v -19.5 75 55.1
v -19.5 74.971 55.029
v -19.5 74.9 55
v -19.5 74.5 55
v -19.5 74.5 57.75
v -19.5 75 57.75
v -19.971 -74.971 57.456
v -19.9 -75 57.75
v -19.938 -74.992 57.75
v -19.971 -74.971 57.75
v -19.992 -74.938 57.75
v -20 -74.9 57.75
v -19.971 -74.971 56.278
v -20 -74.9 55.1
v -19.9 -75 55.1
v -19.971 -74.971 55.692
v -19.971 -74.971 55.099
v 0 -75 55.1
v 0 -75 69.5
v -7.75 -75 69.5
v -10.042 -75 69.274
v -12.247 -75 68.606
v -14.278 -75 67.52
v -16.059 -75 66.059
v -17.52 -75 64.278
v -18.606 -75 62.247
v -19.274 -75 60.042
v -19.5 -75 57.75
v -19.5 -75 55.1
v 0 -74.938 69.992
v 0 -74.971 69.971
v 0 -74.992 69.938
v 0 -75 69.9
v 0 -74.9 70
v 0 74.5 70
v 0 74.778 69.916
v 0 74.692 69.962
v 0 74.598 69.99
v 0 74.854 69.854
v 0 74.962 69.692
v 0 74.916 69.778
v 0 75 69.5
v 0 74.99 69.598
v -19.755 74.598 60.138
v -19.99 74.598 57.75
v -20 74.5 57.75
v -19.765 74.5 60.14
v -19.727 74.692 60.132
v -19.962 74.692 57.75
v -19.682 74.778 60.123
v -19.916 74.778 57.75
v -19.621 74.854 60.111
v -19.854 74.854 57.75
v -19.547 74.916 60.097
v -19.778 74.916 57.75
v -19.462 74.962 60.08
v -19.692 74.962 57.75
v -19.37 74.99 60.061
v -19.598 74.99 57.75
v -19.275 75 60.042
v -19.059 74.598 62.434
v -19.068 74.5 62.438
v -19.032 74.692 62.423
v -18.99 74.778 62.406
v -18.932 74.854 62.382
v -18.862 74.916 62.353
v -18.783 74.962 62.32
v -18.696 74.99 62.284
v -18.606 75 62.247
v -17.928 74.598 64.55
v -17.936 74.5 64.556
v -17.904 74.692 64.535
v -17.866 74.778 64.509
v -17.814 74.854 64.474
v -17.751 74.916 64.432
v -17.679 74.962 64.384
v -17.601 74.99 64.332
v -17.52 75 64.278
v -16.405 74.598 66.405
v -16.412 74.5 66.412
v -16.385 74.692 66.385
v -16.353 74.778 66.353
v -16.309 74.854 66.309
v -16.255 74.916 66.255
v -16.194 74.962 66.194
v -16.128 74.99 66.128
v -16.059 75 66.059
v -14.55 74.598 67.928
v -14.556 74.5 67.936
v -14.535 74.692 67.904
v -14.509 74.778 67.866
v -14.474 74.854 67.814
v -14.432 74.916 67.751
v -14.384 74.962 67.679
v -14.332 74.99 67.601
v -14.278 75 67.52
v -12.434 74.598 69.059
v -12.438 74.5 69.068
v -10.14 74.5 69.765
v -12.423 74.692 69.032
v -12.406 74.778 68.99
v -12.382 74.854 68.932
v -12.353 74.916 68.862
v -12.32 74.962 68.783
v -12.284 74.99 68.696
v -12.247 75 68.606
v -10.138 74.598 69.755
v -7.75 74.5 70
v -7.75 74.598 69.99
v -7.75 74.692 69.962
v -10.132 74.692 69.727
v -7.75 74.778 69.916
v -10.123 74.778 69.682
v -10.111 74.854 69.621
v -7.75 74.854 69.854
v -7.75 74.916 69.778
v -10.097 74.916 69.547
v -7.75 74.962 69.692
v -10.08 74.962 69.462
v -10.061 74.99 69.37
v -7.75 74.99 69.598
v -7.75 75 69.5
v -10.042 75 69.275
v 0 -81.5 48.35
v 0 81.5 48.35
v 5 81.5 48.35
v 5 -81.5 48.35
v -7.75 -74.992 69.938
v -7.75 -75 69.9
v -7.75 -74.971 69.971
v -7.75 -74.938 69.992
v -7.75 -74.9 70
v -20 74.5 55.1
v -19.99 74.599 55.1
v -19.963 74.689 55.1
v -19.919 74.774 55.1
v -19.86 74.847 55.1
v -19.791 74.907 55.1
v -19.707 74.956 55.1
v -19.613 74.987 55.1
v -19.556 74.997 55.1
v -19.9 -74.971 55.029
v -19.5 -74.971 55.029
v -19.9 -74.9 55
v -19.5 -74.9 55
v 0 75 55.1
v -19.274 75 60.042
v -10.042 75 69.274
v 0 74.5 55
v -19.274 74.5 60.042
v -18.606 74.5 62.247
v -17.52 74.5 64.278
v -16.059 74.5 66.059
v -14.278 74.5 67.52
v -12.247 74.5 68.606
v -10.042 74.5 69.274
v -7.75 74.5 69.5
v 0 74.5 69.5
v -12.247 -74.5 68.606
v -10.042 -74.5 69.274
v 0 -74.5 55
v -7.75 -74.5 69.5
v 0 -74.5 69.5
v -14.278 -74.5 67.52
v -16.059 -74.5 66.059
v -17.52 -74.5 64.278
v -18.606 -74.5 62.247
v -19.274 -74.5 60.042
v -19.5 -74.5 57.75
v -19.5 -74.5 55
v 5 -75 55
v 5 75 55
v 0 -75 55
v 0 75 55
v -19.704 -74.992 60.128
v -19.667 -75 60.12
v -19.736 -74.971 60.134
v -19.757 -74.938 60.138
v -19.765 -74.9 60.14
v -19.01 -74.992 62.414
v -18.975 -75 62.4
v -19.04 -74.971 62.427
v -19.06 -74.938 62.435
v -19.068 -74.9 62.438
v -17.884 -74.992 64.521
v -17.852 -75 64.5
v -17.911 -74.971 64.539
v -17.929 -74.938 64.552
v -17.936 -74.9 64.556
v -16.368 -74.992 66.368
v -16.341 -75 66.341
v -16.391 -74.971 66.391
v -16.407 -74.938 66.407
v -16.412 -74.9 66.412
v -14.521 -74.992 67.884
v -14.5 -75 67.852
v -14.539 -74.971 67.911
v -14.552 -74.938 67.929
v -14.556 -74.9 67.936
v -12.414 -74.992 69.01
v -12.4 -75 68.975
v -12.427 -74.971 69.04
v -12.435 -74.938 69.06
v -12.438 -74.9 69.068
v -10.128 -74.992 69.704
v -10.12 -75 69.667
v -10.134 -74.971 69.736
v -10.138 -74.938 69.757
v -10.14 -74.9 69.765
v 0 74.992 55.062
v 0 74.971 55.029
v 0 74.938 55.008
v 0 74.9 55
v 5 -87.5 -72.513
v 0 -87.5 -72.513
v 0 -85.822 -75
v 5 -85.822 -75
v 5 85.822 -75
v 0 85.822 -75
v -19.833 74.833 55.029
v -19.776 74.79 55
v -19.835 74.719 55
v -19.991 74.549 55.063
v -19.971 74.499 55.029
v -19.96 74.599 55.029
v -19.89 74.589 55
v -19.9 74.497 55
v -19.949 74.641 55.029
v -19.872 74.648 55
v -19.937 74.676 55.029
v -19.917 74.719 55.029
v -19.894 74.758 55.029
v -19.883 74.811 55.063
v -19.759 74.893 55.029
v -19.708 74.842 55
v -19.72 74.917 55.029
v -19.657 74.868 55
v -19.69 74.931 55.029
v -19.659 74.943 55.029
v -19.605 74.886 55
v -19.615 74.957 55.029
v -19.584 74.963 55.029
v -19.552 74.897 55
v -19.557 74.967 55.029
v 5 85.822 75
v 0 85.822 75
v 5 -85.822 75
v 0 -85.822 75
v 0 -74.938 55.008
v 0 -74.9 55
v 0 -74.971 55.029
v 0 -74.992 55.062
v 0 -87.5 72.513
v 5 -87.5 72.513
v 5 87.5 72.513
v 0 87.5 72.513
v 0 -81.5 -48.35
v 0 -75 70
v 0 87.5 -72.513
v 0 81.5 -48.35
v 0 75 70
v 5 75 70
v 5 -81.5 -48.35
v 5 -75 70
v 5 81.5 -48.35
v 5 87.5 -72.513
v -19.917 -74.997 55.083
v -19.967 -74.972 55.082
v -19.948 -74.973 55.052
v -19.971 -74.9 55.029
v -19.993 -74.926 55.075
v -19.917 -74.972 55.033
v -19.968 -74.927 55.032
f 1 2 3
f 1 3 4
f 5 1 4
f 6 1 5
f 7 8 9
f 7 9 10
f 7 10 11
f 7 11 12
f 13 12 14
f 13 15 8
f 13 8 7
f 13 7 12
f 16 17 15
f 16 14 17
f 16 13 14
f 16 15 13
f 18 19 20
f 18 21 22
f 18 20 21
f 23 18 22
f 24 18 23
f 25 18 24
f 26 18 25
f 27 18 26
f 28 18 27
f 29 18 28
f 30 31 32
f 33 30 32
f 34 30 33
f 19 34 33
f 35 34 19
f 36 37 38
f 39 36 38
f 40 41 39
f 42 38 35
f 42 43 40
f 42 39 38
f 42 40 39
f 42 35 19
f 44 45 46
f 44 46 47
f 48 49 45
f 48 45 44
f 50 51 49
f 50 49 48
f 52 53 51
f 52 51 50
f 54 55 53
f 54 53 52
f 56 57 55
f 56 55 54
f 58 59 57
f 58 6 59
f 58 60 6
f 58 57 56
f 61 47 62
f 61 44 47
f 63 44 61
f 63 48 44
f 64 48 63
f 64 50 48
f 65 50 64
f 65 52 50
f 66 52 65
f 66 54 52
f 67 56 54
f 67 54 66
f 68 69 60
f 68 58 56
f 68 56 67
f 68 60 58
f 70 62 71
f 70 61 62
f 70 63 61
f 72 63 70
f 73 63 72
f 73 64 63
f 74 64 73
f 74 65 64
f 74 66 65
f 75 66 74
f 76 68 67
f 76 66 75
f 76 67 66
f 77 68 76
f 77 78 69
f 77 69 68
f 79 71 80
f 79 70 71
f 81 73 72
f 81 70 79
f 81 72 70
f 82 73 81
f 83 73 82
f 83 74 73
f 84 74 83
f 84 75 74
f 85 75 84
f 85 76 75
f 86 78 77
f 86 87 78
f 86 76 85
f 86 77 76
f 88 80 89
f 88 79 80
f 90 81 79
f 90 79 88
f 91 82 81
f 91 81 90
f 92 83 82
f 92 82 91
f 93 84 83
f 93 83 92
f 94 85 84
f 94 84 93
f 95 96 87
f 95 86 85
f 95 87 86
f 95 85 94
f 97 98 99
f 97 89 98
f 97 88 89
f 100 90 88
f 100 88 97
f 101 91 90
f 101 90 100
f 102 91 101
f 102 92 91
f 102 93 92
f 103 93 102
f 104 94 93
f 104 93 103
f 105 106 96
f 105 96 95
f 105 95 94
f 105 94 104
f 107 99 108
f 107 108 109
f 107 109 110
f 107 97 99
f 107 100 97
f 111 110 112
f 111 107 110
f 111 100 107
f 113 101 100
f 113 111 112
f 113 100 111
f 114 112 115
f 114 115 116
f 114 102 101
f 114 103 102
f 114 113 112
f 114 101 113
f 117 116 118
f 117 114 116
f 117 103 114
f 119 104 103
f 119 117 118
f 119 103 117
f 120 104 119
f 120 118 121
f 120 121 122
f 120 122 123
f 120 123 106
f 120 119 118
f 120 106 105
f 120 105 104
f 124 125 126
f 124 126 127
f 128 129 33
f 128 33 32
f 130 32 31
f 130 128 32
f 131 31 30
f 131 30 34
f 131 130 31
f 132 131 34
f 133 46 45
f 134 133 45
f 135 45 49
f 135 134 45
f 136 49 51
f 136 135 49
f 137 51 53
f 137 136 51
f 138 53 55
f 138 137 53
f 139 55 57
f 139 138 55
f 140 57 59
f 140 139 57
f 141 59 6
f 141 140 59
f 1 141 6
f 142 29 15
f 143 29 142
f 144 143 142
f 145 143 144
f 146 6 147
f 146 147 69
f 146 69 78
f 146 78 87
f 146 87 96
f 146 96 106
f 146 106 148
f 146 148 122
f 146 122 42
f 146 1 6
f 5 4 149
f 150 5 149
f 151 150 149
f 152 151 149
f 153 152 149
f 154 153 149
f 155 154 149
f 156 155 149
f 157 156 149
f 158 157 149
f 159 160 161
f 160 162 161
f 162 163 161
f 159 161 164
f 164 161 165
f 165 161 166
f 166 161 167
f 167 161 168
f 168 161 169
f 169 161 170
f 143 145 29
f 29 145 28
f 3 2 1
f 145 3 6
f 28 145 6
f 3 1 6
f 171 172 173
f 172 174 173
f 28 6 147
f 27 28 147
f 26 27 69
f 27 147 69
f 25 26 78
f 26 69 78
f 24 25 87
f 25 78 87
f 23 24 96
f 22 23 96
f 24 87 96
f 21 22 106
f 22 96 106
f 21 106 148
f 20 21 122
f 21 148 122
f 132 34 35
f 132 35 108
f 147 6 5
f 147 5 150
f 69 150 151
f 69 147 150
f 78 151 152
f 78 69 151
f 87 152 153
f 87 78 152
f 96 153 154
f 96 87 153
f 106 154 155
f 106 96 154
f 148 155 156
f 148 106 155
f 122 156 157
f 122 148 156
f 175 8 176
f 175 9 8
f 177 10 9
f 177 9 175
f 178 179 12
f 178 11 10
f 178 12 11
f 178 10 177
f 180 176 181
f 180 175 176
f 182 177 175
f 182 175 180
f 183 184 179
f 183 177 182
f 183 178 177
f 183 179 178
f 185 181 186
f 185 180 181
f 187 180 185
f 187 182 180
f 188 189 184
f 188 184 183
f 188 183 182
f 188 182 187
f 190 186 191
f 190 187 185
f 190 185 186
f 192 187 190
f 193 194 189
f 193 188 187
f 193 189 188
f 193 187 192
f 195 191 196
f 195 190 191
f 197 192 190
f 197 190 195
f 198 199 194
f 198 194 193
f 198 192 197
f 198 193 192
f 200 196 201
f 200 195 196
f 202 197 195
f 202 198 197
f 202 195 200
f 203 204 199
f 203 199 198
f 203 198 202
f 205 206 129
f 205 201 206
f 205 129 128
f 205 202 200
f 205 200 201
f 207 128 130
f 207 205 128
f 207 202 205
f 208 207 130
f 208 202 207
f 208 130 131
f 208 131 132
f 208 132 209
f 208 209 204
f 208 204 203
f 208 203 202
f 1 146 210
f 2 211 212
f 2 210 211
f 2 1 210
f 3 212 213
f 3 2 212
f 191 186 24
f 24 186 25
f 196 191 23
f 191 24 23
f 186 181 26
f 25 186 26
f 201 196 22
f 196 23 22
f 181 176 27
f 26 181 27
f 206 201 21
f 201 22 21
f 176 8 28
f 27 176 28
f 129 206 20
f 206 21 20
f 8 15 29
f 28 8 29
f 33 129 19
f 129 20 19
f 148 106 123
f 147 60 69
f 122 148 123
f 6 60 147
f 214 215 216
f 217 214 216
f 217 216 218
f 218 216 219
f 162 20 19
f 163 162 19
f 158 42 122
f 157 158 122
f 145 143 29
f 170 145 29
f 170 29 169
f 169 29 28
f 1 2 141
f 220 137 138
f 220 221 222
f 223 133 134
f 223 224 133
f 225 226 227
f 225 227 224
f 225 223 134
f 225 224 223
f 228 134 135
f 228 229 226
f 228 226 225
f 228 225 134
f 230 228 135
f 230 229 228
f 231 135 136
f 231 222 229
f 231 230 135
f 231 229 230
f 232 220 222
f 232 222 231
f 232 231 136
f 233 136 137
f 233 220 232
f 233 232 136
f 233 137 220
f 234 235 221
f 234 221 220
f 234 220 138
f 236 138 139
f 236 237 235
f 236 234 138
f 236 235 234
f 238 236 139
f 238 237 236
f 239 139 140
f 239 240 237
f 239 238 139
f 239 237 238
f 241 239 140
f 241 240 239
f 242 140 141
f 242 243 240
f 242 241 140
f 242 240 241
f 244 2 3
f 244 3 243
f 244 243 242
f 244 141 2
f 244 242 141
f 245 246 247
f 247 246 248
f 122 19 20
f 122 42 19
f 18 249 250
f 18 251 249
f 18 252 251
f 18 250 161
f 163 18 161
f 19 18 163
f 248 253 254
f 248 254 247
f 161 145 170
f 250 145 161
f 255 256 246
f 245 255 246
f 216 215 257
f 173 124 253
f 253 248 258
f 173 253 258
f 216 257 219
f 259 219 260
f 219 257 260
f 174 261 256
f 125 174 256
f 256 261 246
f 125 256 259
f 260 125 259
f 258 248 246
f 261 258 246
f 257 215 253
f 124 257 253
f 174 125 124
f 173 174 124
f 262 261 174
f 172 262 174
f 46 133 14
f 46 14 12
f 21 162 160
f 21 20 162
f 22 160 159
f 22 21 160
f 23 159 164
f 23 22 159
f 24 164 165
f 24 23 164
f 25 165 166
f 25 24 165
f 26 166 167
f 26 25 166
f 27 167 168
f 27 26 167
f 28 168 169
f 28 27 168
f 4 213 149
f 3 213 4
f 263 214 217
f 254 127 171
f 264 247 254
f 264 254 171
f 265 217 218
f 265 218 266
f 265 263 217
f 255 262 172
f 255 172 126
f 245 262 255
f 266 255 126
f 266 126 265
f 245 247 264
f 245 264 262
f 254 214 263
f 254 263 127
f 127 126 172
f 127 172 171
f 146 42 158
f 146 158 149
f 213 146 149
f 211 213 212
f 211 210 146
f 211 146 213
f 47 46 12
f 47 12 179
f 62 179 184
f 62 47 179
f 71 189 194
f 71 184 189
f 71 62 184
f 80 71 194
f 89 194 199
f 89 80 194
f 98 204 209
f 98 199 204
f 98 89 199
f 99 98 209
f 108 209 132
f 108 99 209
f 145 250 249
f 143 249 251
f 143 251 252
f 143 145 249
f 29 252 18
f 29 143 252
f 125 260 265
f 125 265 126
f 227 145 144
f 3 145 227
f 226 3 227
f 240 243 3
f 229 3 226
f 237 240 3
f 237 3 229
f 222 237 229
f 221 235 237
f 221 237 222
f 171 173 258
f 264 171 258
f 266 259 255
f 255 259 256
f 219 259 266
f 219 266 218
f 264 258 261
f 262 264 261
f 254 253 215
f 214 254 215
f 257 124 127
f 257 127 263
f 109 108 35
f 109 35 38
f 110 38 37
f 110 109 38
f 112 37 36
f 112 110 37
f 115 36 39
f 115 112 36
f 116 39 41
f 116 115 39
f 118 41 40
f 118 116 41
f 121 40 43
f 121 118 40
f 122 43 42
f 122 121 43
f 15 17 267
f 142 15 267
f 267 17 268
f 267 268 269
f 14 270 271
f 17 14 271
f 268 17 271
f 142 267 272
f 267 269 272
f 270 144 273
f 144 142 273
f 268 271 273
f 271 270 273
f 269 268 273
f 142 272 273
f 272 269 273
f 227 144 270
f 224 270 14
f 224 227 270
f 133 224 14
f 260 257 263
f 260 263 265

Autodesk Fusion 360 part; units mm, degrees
sketch "Sketch1" plane through (0, 0, 0) normal (1, 0, 0) x (0, 1, 0)
  line L0 (87.5, 75) -> (-87.5, 75)
  line L1 (-87.5, 75) -> (-87.5, -75)
  line L2 (-87.5, -75) -> (87.5, -75)
  line L3 (87.5, -75) -> (87.5, 75)
  line L4 (87.5, 75) -> (-87.5, -75) construction
  line L5 (-87.5, 75) -> (87.5, -75) construction
  line L6 (-87.5, 72.5134) -> (-85.8217, 75)
  line L7 (0, 75) -> (0, -75) construction
  line L8 (-87.5, 0) -> (87.5, 0) construction
  line L9 (87.5, 72.5134) -> (85.8217, 75)
  line L10 (87.5, -72.5134) -> (85.8217, -75)
  line L11 (-87.5, -72.5134) -> (-85.8217, -75)
  line L12 (81.5, 48.35) -> (-81.5, 48.35)
  line L13 (-81.5, 48.35) -> (-81.5, -48.35)
  line L14 (-81.5, -48.35) -> (81.5, -48.35)
  line L15 (81.5, -48.35) -> (81.5, 48.35)
  line L16 (81.5, 48.35) -> (-81.5, -48.35) construction
  line L17 (-81.5, 48.35) -> (81.5, -48.35) construction
  line L18 (75, 55) -> (-75, 55)
  line L19 (-75, 55) -> (-75, 70)
  line L20 (-75, 70) -> (75, 70)
  line L21 (75, 70) -> (75, 55)
  line L22 (75, 55) -> (-75, 70) construction
  line L23 (-75, 55) -> (75, 70) construction
  point P0 (0, 62.5)
  dimension "d1" = 175
  dimension "d2" = 150
  dimension "d3" = 3
  dimension "d4" = 163
  dimension "d5" = 96.7
  dimension "d8" = 150
  dimension "d9" = 15
  dimension "d10" = 5
extrude "Extrude1" add sketch "Sketch1" along normal blind 5 contours L0 L1 L2 L3 L6 L9 L10 L11 | L18 L19 L20 L21 makes body 1
extrude "Extrude2" cut sketch "Sketch1" along normal blind 10 contours L18 L19 L20 L21 bodies 1
sketch "Sketch2" plane through (0, 0, 0) normal (-1, 0, 0) x (0, -1, 0)
  line L0 (-75, 55) -> (-75, 70)
  line L1 (-75, 70) -> (75, 70)
  line L2 (75, 70) -> (75, 55)
  line L3 (75, 55) -> (-75, 55)
  line L4 (-81.5, -48.35) -> (-81.5, 48.35)
  line L5 (-81.5, 48.35) -> (81.5, 48.35)
  line L6 (81.5, 48.35) -> (81.5, -48.35)
  line L7 (81.5, -48.35) -> (-81.5, -48.35)
  line L8 (87.5, -72.5134) -> (87.5, 72.5134)
  line L9 (87.5, 72.5134) -> (85.8217, 75)
  line L10 (85.8217, 75) -> (-85.8217, 75)
  line L11 (-85.8217, 75) -> (-87.5, 72.5134)
  line L12 (-87.5, 72.5134) -> (-87.5, -72.5134)
  line L13 (-87.5, -72.5134) -> (-85.8217, -75)
  line L14 (-85.8217, -75) -> (85.8217, -75)
  line L15 (85.8217, -75) -> (87.5, -72.5134)
ref_plane "WorkPlane1" through (0, 75, 0) normal (0, 1, 0) x (0, 0, 1)
sketch "Sketch3" plane through (0, 75, 0) normal (0, 1, 0) x (1, 0, 0)
  line L0 (0, -55) -> (-20, -55)
  line L1 (0, -70) -> (-7.75, -70)
  spline S0 degree 1 poles (-20, -55) (-20, -57.75) knots 0 0 0.183333 0.183333
  arc A0 (-20, -57.75) -> (-7.75, -70) centre (-7.75, -57.75) ccw
  line L2 (-20, -55) -> (-20, -57.75) construction
  line L3 (0, -70) -> (0, -55)
  line L4 (0, -69.5) -> (-7.75, -69.5)
  arc A1 (-19.5, -57.75) -> (-7.75, -69.5) centre (-7.75, -57.75) ccw
  spline S1 degree 1 poles (-19.5, -55) (-19.5, -57.75) knots 0 0 0.275 0.275
  point P0 (0, -70)
  point P1 (0, -55)
  dimension "d14" = 20
  dimension "d15" = 12.25
  dimension "d16" = -0.5
  dimension "d17" = -0.5
extrude "Extrude3" add sketch "Sketch3" against normal blind 150 separate body contours L0 L1 S0 A0 L3 L4 A1 S1 makes body 2
extrude "Extrude4" add sketch "Sketch3" against normal blind 0.5 separate body contours L0 L3 L4 A1 S1 makes body 3
mirror "Mirror1" about plane through (0, 0, 0) normal (0, 1, 0) of bodies 3 makes body 4
fillet "Fillet1" radius 0.5 3 edges at (-3.875, 75, 70) (-16.4121, 75, 66.4121) (-20, 75, 56.375) on bodies 2
fillet "Fillet2" radius 0.1 1 edges at (-9.75, 75, 55) on bodies 3
fillet "Fillet3" radius 0.1 2 edges at (-19.8536, 74.8536, 55) (-20, -0.25, 55) on bodies 2
fillet "Fillet4" radius 0.1 1 edges at (-9.75, -75, 55) on bodies 4
fillet "Fillet5" radius 0.1 5 edges at (-3.875, -75, 70) (-16.4121, -75, 66.4121) (-20, -75, 56.425) (-19.9707, -75, 55.0293) (-19.7, -75, 55) on bodies 2
